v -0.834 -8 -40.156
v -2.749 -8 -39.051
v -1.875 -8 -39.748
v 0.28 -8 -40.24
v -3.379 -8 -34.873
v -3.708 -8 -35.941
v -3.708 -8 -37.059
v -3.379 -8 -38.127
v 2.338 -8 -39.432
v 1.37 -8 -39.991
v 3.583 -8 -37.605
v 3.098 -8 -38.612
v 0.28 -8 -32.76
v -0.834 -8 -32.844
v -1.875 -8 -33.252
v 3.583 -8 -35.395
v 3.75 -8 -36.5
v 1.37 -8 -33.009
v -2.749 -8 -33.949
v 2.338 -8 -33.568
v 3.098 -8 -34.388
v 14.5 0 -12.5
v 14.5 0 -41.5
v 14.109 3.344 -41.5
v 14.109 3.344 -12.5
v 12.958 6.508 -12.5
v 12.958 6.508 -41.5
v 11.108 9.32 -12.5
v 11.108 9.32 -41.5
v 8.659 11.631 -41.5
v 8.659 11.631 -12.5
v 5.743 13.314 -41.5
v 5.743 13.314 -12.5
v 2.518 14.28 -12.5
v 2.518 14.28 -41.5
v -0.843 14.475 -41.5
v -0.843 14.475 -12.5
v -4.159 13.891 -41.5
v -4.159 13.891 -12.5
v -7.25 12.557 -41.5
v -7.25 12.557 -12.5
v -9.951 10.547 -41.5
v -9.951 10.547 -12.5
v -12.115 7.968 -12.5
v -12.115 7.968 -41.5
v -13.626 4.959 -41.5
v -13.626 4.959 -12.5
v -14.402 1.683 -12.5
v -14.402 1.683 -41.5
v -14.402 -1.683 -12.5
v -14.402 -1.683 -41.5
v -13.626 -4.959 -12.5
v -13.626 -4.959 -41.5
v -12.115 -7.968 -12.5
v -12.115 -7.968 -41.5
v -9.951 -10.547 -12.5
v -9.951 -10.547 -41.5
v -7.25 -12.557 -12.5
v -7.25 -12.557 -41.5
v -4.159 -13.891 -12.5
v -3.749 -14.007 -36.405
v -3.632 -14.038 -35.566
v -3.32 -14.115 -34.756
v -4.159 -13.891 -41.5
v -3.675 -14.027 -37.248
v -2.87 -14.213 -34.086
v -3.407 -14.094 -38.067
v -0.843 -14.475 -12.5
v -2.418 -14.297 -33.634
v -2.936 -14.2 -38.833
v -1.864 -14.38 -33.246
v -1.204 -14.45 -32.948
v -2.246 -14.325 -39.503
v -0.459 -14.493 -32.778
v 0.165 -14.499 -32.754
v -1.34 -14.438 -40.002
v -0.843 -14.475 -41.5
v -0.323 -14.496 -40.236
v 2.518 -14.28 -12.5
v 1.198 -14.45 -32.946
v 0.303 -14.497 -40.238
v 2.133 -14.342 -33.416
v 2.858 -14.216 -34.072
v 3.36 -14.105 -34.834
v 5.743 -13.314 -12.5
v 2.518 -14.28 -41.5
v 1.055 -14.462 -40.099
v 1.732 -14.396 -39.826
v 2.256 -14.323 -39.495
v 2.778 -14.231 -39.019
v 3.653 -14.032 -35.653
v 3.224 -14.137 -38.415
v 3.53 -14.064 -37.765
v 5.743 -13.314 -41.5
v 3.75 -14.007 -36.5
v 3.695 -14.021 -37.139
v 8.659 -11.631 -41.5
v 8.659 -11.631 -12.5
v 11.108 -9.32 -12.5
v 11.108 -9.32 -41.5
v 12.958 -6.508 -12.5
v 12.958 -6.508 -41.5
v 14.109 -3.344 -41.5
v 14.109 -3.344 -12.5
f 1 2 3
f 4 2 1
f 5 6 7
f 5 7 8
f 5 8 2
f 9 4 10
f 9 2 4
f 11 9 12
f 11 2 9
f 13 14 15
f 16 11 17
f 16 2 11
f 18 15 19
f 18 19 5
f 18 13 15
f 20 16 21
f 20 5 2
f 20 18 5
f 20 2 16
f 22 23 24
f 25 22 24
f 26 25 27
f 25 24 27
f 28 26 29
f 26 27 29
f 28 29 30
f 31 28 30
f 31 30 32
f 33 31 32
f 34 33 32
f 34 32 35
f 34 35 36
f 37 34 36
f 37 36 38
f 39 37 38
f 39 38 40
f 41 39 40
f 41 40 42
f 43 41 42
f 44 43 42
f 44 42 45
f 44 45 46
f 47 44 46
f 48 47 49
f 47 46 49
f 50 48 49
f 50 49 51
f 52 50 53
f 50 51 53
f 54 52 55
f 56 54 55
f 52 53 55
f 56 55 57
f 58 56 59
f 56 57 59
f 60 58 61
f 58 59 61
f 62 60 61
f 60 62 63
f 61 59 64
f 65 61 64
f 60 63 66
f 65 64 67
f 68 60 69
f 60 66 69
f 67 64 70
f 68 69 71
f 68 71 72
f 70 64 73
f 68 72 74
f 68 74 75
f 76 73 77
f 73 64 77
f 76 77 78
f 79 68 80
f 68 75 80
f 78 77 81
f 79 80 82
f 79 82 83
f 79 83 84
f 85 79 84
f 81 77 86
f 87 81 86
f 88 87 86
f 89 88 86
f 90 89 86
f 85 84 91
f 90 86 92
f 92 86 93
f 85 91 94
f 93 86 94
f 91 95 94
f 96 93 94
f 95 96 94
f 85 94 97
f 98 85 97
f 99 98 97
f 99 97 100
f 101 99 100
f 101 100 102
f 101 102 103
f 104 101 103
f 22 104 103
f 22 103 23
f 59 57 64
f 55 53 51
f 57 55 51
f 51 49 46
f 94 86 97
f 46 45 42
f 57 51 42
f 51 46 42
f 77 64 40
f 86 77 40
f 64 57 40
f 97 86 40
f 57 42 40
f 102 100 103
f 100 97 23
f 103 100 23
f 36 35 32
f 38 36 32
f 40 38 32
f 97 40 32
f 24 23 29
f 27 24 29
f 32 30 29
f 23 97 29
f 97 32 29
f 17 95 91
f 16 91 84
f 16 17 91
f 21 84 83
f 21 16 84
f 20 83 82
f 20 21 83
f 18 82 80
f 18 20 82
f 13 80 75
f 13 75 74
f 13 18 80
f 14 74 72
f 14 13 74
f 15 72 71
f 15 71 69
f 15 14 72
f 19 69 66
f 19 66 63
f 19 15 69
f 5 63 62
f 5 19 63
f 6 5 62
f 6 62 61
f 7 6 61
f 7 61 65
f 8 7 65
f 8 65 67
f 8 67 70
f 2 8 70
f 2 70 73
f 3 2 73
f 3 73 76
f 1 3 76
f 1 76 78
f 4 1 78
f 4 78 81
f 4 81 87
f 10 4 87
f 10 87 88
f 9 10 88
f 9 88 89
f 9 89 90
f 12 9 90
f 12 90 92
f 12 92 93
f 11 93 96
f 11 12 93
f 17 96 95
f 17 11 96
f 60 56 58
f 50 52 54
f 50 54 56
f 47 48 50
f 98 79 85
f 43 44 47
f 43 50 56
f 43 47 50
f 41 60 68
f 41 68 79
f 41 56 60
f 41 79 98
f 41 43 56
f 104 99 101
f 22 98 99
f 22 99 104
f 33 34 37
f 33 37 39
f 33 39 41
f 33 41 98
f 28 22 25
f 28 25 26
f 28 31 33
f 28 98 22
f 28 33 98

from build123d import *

# Parameters (mm, degrees)
CYLINDER215_R     = 3.75
CYLINDER215_DEPTH = 10
CYLINDER211_R     = 14.5
CYLINDER211_DEPTH = 29


with BuildPart() as cylinder215:
    # Cylinder215 → Cylinder215 (new body)
    with BuildSketch(Plane(origin=(0, -8, -36.5), x_dir=(1, 0, 0), z_dir=(0, -1, 0))):
        Circle(CYLINDER215_R)
    extrude(amount=CYLINDER215_DEPTH)


with BuildPart() as base011:
    # Cylinder211 → Cylinder211 (new body)
    with BuildSketch(Plane.XY.offset(-41.5)):
        Circle(CYLINDER211_R)
    extrude(amount=CYLINDER211_DEPTH)

    # Cut152: cut Cylinder215
    add(cylinder215.part, mode=Mode.SUBTRACT)


solid = base011.part
